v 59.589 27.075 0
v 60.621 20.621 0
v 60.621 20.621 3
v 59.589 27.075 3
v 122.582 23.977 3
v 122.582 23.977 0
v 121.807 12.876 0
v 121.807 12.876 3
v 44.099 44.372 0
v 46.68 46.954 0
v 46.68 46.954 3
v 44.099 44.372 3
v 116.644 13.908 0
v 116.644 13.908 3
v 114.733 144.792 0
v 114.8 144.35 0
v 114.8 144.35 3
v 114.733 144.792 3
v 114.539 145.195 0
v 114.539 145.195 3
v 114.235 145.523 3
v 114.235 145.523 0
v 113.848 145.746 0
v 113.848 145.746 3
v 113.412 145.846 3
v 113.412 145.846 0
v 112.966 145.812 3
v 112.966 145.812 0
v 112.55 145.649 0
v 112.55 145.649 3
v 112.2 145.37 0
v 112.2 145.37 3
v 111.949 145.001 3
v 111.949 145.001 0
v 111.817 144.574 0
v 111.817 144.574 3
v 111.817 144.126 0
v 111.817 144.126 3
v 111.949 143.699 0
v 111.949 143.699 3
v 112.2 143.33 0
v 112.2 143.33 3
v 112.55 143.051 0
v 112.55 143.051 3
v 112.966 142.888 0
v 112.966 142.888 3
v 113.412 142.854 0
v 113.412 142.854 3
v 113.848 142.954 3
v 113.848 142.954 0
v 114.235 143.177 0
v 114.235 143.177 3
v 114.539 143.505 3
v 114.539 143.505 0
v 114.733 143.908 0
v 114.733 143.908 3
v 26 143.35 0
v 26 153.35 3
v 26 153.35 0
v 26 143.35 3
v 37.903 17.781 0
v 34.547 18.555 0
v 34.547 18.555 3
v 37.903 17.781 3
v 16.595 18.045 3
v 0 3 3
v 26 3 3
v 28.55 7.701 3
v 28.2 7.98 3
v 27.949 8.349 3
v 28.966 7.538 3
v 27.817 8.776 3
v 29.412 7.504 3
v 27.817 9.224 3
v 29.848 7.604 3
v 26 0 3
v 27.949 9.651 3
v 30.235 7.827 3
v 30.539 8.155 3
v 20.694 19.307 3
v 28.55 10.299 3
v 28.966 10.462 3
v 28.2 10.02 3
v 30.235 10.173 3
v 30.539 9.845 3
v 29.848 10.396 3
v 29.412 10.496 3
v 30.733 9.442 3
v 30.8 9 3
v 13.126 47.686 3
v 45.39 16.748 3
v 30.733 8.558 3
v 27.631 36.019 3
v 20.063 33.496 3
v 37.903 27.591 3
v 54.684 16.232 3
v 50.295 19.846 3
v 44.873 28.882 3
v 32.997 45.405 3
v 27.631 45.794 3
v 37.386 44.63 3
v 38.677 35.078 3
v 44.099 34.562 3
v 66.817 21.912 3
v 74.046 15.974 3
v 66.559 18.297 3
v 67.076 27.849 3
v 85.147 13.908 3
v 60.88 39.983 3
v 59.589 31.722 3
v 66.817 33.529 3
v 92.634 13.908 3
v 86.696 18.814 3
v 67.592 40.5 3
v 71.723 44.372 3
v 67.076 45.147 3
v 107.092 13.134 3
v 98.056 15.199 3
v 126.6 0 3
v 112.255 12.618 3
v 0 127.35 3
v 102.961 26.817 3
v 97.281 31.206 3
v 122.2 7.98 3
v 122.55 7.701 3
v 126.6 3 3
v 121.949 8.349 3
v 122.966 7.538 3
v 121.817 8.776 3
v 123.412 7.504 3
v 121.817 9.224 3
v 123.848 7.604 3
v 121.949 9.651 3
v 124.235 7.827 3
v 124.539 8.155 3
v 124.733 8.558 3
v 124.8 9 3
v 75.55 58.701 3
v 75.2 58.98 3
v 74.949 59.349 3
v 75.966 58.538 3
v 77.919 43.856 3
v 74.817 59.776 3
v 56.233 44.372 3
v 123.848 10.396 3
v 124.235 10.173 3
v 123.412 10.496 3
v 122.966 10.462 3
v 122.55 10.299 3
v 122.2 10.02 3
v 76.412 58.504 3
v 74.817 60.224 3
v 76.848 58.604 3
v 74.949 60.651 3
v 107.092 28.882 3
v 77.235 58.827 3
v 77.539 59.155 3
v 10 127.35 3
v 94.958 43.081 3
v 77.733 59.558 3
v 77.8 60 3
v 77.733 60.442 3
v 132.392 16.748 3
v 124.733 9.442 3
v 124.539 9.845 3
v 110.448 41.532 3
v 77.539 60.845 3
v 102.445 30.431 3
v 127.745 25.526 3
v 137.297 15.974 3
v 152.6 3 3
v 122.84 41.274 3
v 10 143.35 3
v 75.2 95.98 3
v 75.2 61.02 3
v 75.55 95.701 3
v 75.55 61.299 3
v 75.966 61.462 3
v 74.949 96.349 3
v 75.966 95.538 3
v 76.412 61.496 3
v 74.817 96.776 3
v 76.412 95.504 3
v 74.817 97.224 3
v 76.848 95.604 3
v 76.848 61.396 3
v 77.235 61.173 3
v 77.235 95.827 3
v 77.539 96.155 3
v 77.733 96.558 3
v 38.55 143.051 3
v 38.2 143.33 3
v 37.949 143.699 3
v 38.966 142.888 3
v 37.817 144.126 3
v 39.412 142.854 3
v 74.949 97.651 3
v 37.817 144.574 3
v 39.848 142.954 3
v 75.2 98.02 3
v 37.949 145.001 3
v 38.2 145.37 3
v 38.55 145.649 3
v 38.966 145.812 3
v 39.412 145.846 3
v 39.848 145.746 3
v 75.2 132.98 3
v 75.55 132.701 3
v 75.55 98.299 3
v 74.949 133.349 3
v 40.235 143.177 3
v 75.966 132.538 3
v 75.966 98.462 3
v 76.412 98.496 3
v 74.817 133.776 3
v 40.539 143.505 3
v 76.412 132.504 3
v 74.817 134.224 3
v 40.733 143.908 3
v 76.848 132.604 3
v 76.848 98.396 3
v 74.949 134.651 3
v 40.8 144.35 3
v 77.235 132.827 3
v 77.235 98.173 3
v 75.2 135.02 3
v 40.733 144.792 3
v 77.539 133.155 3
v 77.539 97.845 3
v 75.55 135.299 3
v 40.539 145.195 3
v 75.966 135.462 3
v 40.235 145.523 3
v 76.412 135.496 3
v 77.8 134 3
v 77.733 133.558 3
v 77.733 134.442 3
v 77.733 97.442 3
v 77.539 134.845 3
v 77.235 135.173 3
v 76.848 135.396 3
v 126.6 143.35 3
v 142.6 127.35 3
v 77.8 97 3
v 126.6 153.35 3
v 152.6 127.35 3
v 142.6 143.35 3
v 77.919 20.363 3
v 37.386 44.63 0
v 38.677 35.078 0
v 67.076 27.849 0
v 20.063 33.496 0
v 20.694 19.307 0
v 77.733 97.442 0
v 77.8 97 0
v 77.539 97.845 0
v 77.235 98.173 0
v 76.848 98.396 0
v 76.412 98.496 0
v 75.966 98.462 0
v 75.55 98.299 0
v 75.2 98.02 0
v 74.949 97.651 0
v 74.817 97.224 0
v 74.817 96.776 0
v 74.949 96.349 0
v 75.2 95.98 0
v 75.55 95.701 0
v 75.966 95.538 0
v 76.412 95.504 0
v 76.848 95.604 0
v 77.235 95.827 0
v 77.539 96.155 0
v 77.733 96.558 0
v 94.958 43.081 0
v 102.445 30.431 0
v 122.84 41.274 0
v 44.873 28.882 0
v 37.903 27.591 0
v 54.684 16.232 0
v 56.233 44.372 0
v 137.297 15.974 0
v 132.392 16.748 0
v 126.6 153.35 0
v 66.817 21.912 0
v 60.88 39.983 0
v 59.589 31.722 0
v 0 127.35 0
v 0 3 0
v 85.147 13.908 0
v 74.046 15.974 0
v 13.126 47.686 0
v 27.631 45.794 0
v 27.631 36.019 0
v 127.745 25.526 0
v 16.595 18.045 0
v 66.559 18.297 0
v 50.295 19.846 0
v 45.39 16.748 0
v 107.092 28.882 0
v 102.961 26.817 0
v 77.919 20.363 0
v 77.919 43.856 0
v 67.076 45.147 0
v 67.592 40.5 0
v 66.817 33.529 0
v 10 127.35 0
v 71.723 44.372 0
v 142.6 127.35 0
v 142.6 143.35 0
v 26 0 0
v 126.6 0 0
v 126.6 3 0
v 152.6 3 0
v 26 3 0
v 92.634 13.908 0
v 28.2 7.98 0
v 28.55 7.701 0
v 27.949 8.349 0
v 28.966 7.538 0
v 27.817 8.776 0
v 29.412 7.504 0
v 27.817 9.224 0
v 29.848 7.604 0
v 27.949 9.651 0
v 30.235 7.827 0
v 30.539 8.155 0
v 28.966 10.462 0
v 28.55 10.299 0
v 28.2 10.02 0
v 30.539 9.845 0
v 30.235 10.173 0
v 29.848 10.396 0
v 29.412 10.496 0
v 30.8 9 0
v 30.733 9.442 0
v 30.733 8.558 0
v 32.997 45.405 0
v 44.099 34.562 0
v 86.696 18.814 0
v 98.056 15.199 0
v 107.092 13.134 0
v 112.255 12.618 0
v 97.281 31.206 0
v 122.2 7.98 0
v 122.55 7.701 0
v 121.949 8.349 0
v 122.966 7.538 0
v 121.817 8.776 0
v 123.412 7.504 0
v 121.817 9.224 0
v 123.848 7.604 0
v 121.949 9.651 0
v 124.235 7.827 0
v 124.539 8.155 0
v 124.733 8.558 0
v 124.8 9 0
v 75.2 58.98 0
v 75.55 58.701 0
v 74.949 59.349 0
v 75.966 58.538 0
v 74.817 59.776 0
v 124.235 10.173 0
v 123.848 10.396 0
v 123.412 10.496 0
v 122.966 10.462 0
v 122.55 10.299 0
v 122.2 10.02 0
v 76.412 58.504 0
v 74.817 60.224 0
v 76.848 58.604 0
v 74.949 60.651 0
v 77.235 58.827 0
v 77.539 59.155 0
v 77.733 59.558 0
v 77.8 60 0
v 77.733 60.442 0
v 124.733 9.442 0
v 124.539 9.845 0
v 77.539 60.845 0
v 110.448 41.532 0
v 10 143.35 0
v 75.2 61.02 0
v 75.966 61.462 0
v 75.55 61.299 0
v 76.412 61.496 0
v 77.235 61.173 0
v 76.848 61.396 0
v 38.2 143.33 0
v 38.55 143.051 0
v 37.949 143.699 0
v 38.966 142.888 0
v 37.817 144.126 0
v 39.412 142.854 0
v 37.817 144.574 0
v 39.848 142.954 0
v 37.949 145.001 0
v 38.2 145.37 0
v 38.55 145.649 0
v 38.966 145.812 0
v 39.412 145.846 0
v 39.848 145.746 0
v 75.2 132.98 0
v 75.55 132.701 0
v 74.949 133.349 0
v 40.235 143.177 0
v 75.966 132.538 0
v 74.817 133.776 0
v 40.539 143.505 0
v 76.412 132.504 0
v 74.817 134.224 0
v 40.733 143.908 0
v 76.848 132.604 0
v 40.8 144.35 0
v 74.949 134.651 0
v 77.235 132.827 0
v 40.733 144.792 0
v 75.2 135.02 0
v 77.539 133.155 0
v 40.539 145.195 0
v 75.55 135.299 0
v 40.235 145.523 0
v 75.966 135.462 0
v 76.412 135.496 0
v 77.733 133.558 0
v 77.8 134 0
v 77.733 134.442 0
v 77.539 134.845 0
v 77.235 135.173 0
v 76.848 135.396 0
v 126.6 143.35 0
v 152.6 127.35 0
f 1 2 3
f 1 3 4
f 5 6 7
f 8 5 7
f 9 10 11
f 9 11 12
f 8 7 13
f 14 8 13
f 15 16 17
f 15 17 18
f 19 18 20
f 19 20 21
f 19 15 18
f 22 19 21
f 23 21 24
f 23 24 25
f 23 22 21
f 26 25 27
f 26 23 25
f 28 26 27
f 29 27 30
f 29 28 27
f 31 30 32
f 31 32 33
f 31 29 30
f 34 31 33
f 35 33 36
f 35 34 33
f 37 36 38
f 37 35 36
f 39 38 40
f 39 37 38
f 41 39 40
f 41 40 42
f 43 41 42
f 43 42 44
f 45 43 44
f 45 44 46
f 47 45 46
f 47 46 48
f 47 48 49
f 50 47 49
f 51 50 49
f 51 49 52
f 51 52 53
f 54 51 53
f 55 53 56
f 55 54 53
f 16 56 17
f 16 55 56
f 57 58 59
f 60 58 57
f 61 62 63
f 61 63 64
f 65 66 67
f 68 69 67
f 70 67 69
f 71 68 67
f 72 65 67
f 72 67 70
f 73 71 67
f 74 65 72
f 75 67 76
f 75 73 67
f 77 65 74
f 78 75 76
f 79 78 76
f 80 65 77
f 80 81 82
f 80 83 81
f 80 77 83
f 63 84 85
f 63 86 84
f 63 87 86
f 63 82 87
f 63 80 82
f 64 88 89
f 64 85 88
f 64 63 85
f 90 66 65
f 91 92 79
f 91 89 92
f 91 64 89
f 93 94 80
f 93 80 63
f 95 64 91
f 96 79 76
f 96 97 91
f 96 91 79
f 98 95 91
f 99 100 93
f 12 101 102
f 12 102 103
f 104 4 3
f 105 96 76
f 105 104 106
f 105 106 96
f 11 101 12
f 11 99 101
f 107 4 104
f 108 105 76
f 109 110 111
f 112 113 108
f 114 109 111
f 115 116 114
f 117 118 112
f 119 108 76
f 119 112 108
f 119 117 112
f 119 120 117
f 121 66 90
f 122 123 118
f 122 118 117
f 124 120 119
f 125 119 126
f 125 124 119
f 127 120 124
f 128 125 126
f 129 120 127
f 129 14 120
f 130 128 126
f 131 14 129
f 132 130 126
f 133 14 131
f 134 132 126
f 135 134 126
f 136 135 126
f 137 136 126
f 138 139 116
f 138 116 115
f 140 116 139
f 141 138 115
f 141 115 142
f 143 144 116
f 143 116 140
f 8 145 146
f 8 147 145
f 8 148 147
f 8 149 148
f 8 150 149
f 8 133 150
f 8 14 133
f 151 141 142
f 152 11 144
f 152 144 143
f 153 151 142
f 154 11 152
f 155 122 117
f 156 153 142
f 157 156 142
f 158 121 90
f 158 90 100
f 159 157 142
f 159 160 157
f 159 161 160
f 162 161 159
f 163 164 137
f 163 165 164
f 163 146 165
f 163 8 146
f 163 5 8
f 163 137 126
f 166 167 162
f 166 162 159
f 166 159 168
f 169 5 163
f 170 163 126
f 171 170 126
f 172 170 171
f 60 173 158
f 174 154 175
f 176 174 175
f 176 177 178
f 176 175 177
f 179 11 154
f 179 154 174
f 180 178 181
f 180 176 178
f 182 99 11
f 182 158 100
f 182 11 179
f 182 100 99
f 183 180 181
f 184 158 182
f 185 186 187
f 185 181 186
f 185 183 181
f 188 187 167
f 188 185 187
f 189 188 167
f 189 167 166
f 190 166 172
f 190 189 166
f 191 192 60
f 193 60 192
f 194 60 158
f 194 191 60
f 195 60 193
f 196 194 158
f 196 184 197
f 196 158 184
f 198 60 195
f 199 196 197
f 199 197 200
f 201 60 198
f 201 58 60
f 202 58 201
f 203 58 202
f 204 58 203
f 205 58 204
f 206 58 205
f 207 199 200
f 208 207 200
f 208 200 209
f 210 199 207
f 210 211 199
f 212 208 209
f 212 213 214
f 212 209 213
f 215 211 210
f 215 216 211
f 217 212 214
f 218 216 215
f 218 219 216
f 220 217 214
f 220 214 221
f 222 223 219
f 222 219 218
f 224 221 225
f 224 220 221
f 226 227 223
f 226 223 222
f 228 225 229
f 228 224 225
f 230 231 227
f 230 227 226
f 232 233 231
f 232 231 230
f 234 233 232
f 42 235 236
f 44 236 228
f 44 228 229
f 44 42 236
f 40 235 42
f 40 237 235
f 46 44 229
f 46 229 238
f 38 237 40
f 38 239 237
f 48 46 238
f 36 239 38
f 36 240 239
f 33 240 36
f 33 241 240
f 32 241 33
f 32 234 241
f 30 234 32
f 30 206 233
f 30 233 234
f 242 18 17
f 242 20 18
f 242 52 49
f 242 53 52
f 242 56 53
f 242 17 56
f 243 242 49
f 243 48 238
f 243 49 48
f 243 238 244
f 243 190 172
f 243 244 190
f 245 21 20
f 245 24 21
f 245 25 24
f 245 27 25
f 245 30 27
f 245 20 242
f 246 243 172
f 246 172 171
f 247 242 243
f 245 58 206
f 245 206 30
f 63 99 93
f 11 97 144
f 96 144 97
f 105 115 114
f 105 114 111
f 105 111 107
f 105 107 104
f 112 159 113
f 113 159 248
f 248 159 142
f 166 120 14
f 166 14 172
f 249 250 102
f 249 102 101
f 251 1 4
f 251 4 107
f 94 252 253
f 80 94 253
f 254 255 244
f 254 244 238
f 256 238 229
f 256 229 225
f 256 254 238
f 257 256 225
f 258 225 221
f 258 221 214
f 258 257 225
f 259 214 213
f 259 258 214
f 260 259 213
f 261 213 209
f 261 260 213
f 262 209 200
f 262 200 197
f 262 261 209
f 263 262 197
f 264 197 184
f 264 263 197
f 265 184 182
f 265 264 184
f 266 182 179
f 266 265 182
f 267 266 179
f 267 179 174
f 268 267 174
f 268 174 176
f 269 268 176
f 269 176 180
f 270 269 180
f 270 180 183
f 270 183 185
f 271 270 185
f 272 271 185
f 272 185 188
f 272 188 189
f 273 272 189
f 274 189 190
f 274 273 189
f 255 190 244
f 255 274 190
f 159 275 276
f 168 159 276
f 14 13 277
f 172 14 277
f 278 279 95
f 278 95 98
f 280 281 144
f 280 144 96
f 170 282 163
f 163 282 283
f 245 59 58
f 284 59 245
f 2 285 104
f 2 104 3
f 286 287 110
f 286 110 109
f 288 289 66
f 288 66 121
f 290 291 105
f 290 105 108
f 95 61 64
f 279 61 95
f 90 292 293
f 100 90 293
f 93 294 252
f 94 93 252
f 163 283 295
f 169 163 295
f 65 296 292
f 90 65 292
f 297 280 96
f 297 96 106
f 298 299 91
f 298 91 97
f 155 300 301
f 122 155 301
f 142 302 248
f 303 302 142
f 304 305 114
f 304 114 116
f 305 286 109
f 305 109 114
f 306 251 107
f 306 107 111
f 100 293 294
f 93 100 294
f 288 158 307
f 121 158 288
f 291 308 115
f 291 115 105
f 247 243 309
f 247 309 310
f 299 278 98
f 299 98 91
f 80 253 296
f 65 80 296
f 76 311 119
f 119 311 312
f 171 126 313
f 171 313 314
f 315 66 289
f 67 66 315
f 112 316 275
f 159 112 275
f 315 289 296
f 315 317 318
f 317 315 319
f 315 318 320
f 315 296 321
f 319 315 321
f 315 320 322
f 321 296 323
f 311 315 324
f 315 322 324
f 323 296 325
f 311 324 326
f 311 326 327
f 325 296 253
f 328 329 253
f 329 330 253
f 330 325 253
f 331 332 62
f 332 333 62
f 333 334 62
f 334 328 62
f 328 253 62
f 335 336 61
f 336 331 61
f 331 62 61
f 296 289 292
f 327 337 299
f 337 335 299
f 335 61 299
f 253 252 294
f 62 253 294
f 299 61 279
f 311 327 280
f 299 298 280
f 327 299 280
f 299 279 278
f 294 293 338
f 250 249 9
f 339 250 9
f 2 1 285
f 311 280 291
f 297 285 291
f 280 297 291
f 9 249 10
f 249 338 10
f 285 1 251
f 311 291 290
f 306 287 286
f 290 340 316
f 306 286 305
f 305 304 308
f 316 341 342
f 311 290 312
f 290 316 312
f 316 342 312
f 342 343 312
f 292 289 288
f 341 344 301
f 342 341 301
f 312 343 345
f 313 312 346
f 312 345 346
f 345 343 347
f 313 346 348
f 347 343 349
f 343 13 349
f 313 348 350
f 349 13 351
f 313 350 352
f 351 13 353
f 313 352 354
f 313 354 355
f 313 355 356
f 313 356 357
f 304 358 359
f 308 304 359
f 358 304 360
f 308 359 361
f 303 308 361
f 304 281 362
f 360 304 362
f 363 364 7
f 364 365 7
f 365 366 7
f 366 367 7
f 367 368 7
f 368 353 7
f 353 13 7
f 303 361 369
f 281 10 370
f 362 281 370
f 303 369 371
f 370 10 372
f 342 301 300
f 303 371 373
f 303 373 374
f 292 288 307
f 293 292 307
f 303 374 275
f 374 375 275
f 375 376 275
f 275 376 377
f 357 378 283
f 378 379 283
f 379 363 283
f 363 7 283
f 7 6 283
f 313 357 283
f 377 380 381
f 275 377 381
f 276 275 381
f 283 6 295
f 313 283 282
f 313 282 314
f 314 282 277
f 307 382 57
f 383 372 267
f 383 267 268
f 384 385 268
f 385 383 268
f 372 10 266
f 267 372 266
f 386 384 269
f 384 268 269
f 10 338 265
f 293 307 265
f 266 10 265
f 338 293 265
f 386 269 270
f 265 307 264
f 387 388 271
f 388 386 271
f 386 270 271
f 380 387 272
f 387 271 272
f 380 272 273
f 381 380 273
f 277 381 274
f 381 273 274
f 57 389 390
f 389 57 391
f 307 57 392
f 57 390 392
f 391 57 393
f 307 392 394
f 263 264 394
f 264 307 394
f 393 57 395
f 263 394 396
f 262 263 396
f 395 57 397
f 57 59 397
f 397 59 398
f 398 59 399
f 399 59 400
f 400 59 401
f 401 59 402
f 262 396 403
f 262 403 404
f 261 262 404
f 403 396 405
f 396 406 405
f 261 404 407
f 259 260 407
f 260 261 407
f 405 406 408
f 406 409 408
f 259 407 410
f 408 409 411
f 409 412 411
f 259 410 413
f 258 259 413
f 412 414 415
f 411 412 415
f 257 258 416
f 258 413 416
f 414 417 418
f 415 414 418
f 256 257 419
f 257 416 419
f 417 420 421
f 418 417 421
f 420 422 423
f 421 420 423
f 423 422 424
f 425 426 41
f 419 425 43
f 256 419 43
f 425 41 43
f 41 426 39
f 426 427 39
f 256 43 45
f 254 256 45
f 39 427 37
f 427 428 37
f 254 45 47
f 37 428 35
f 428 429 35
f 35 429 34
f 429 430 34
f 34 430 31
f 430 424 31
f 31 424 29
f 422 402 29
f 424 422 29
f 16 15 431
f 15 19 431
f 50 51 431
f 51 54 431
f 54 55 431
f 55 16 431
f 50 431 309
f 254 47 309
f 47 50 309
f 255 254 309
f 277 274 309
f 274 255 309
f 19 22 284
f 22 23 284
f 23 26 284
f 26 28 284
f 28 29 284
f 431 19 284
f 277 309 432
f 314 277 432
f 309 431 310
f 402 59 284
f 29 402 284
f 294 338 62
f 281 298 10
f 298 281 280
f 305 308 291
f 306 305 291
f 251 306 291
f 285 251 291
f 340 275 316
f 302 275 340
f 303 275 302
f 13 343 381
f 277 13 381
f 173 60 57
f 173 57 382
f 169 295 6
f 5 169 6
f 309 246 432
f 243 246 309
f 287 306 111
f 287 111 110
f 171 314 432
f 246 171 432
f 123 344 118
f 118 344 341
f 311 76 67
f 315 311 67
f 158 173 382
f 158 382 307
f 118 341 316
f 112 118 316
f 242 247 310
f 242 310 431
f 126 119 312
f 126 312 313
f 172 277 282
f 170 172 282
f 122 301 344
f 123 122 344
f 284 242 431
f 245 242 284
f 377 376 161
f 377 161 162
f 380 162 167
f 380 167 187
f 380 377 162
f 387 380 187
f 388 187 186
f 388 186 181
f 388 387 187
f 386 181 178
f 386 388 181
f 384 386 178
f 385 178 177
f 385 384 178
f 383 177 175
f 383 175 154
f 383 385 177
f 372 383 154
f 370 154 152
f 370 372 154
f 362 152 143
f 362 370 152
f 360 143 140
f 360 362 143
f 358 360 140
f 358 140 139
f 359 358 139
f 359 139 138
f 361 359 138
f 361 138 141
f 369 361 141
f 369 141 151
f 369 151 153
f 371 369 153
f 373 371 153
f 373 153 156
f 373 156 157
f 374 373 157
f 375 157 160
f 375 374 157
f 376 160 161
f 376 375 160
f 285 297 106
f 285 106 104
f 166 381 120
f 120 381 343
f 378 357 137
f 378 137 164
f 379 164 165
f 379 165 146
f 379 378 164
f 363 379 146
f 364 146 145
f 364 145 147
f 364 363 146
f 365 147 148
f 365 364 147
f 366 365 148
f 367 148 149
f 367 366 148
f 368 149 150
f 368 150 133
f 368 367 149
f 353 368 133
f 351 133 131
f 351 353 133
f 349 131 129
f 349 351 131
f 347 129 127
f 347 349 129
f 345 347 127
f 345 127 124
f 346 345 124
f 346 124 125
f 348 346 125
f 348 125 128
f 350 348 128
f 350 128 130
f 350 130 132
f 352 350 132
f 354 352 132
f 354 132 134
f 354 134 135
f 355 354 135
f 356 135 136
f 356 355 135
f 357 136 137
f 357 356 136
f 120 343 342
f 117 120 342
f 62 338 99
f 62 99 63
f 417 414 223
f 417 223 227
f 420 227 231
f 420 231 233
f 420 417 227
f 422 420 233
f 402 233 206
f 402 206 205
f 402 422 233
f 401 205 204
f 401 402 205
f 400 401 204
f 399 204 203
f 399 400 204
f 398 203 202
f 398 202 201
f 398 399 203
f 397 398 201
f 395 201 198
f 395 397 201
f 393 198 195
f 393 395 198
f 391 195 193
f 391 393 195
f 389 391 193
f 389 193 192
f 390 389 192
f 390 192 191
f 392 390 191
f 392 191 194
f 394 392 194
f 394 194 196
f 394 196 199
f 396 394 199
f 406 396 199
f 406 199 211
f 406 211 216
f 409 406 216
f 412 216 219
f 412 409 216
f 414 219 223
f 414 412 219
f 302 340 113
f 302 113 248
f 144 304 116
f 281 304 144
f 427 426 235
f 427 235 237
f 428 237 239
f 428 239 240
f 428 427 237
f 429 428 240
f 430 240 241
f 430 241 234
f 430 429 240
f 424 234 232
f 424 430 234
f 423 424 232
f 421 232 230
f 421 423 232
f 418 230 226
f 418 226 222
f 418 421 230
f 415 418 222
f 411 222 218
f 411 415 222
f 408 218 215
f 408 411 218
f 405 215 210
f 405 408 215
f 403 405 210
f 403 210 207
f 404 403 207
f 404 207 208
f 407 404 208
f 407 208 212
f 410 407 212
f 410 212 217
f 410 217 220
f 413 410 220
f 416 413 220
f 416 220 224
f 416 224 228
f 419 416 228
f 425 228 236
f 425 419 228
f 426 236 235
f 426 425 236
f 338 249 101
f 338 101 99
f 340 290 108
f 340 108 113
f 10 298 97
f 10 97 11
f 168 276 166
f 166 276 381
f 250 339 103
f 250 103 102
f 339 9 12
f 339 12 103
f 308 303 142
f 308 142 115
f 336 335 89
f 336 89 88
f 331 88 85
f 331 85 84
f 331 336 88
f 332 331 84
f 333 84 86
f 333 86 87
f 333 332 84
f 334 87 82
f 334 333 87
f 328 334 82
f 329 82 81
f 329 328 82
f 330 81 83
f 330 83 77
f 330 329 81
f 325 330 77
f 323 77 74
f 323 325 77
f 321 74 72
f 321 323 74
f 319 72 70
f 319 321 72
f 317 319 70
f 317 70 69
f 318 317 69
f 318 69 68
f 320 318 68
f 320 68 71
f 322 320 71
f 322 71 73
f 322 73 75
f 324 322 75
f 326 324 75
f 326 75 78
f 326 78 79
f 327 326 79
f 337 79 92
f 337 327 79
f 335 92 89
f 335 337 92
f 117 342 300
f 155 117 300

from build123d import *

# Parameters (mm, degrees)
SKETCH_W     = 152.6
SKETCH_H     = 153.35
SKETCH_R     = 1.5
PAD_DEPTH    = 3
SKETCH001_W  = 26
SKETCH001_H  = 3
POCKET_DEPTH = 3.001


with BuildPart() as part:
    # Sketch → Pad (new body)
    with BuildSketch(Plane.XY):
        with Locations((76.3, 76.675)):
            Rectangle(SKETCH_W, SKETCH_H)
        with Locations((76.3, 60)):
            Circle(SKETCH_R, mode=Mode.SUBTRACT)
        with Locations((76.3, 97)):
            Circle(SKETCH_R, mode=Mode.SUBTRACT)
        with Locations((76.3, 134)):
            Circle(SKETCH_R, mode=Mode.SUBTRACT)
        with Locations((29.3, 9)):
            Circle(SKETCH_R, mode=Mode.SUBTRACT)
        with Locations((123.3, 9)):
            Circle(SKETCH_R, mode=Mode.SUBTRACT)
        with Locations((39.3, 144.35)):
            Circle(SKETCH_R, mode=Mode.SUBTRACT)
        with Locations((113.3, 144.35)):
            Circle(SKETCH_R, mode=Mode.SUBTRACT)
        Polygon((16.594608, 18.045477), (13.126014, 47.686184), (27.631041, 45.794216), (27.631041, 36.019093), (20.063204, 33.496487), (20.693857, 19.306786), align=None, mode=Mode.SUBTRACT)
        Polygon((32.997498, 45.404831), (34.546509, 18.555393), (37.902687, 17.780891), (37.902687, 27.591261), (44.873211, 28.882099), (45.389542, 16.748219), (50.294739, 19.84623), (46.680386, 46.953835), (44.098709, 44.372162), (44.098709, 34.561787), (38.677189, 35.078121), (37.386356, 44.630322), align=None, mode=Mode.SUBTRACT)
        Polygon((56.23259, 44.372162), (54.683586, 16.231882), (66.559303, 18.297228), (66.817459, 21.91157), (60.621437, 20.620731), (59.588772, 27.074924), (67.075638, 27.849426), (66.817459, 33.529118), (59.588772, 31.721945), (60.879608, 39.983311), (67.591965, 40.499641), (67.075638, 45.14666), align=None, mode=Mode.SUBTRACT)
        Polygon((71.722649, 44.372162), (74.046158, 15.973718), (85.147362, 13.908373), (86.696373, 18.813559), (77.918671, 20.362566), (77.918671, 43.85582), align=None, mode=Mode.SUBTRACT)
        Polygon((92.634232, 13.908373), (94.957733, 43.081318), (102.444595, 30.431107), (110.447807, 41.532314), (112.254982, 12.617536), (107.091621, 13.133871), (107.091621, 28.882099), (102.960938, 26.816759), (97.28125, 31.205608), (98.055763, 15.19921), align=None, mode=Mode.SUBTRACT)
        Polygon((116.643814, 13.908373), (122.839851, 41.274143), (137.297241, 15.973718), (132.392059, 16.748219), (127.745033, 25.525917), (122.581673, 23.976913), (121.807167, 12.875706), align=None, mode=Mode.SUBTRACT)
    extrude(amount=PAD_DEPTH)

    # Sketch001 → Pocket (cut, through all)
    with BuildSketch(Plane.XY.offset(3)):
        Polygon((0, 153.35), (26, 153.35), (26, 143.35), (10, 143.35), (10, 127.35), (0, 127.35), (0, 146.35), align=None)
        with Locations((13, 1.5)):
            Rectangle(SKETCH001_W, SKETCH001_H)
        Polygon((126.6, 153.35), (152.6, 153.35), (152.6, 146.35), (152.6, 127.35), (142.6, 127.35), (142.6, 143.35), (126.6, 143.35), align=None)
        with Locations((139.6, 1.5)):
            Rectangle(SKETCH001_W, SKETCH001_H)
    extrude(amount=-POCKET_DEPTH, mode=Mode.SUBTRACT)


solid = part.part
